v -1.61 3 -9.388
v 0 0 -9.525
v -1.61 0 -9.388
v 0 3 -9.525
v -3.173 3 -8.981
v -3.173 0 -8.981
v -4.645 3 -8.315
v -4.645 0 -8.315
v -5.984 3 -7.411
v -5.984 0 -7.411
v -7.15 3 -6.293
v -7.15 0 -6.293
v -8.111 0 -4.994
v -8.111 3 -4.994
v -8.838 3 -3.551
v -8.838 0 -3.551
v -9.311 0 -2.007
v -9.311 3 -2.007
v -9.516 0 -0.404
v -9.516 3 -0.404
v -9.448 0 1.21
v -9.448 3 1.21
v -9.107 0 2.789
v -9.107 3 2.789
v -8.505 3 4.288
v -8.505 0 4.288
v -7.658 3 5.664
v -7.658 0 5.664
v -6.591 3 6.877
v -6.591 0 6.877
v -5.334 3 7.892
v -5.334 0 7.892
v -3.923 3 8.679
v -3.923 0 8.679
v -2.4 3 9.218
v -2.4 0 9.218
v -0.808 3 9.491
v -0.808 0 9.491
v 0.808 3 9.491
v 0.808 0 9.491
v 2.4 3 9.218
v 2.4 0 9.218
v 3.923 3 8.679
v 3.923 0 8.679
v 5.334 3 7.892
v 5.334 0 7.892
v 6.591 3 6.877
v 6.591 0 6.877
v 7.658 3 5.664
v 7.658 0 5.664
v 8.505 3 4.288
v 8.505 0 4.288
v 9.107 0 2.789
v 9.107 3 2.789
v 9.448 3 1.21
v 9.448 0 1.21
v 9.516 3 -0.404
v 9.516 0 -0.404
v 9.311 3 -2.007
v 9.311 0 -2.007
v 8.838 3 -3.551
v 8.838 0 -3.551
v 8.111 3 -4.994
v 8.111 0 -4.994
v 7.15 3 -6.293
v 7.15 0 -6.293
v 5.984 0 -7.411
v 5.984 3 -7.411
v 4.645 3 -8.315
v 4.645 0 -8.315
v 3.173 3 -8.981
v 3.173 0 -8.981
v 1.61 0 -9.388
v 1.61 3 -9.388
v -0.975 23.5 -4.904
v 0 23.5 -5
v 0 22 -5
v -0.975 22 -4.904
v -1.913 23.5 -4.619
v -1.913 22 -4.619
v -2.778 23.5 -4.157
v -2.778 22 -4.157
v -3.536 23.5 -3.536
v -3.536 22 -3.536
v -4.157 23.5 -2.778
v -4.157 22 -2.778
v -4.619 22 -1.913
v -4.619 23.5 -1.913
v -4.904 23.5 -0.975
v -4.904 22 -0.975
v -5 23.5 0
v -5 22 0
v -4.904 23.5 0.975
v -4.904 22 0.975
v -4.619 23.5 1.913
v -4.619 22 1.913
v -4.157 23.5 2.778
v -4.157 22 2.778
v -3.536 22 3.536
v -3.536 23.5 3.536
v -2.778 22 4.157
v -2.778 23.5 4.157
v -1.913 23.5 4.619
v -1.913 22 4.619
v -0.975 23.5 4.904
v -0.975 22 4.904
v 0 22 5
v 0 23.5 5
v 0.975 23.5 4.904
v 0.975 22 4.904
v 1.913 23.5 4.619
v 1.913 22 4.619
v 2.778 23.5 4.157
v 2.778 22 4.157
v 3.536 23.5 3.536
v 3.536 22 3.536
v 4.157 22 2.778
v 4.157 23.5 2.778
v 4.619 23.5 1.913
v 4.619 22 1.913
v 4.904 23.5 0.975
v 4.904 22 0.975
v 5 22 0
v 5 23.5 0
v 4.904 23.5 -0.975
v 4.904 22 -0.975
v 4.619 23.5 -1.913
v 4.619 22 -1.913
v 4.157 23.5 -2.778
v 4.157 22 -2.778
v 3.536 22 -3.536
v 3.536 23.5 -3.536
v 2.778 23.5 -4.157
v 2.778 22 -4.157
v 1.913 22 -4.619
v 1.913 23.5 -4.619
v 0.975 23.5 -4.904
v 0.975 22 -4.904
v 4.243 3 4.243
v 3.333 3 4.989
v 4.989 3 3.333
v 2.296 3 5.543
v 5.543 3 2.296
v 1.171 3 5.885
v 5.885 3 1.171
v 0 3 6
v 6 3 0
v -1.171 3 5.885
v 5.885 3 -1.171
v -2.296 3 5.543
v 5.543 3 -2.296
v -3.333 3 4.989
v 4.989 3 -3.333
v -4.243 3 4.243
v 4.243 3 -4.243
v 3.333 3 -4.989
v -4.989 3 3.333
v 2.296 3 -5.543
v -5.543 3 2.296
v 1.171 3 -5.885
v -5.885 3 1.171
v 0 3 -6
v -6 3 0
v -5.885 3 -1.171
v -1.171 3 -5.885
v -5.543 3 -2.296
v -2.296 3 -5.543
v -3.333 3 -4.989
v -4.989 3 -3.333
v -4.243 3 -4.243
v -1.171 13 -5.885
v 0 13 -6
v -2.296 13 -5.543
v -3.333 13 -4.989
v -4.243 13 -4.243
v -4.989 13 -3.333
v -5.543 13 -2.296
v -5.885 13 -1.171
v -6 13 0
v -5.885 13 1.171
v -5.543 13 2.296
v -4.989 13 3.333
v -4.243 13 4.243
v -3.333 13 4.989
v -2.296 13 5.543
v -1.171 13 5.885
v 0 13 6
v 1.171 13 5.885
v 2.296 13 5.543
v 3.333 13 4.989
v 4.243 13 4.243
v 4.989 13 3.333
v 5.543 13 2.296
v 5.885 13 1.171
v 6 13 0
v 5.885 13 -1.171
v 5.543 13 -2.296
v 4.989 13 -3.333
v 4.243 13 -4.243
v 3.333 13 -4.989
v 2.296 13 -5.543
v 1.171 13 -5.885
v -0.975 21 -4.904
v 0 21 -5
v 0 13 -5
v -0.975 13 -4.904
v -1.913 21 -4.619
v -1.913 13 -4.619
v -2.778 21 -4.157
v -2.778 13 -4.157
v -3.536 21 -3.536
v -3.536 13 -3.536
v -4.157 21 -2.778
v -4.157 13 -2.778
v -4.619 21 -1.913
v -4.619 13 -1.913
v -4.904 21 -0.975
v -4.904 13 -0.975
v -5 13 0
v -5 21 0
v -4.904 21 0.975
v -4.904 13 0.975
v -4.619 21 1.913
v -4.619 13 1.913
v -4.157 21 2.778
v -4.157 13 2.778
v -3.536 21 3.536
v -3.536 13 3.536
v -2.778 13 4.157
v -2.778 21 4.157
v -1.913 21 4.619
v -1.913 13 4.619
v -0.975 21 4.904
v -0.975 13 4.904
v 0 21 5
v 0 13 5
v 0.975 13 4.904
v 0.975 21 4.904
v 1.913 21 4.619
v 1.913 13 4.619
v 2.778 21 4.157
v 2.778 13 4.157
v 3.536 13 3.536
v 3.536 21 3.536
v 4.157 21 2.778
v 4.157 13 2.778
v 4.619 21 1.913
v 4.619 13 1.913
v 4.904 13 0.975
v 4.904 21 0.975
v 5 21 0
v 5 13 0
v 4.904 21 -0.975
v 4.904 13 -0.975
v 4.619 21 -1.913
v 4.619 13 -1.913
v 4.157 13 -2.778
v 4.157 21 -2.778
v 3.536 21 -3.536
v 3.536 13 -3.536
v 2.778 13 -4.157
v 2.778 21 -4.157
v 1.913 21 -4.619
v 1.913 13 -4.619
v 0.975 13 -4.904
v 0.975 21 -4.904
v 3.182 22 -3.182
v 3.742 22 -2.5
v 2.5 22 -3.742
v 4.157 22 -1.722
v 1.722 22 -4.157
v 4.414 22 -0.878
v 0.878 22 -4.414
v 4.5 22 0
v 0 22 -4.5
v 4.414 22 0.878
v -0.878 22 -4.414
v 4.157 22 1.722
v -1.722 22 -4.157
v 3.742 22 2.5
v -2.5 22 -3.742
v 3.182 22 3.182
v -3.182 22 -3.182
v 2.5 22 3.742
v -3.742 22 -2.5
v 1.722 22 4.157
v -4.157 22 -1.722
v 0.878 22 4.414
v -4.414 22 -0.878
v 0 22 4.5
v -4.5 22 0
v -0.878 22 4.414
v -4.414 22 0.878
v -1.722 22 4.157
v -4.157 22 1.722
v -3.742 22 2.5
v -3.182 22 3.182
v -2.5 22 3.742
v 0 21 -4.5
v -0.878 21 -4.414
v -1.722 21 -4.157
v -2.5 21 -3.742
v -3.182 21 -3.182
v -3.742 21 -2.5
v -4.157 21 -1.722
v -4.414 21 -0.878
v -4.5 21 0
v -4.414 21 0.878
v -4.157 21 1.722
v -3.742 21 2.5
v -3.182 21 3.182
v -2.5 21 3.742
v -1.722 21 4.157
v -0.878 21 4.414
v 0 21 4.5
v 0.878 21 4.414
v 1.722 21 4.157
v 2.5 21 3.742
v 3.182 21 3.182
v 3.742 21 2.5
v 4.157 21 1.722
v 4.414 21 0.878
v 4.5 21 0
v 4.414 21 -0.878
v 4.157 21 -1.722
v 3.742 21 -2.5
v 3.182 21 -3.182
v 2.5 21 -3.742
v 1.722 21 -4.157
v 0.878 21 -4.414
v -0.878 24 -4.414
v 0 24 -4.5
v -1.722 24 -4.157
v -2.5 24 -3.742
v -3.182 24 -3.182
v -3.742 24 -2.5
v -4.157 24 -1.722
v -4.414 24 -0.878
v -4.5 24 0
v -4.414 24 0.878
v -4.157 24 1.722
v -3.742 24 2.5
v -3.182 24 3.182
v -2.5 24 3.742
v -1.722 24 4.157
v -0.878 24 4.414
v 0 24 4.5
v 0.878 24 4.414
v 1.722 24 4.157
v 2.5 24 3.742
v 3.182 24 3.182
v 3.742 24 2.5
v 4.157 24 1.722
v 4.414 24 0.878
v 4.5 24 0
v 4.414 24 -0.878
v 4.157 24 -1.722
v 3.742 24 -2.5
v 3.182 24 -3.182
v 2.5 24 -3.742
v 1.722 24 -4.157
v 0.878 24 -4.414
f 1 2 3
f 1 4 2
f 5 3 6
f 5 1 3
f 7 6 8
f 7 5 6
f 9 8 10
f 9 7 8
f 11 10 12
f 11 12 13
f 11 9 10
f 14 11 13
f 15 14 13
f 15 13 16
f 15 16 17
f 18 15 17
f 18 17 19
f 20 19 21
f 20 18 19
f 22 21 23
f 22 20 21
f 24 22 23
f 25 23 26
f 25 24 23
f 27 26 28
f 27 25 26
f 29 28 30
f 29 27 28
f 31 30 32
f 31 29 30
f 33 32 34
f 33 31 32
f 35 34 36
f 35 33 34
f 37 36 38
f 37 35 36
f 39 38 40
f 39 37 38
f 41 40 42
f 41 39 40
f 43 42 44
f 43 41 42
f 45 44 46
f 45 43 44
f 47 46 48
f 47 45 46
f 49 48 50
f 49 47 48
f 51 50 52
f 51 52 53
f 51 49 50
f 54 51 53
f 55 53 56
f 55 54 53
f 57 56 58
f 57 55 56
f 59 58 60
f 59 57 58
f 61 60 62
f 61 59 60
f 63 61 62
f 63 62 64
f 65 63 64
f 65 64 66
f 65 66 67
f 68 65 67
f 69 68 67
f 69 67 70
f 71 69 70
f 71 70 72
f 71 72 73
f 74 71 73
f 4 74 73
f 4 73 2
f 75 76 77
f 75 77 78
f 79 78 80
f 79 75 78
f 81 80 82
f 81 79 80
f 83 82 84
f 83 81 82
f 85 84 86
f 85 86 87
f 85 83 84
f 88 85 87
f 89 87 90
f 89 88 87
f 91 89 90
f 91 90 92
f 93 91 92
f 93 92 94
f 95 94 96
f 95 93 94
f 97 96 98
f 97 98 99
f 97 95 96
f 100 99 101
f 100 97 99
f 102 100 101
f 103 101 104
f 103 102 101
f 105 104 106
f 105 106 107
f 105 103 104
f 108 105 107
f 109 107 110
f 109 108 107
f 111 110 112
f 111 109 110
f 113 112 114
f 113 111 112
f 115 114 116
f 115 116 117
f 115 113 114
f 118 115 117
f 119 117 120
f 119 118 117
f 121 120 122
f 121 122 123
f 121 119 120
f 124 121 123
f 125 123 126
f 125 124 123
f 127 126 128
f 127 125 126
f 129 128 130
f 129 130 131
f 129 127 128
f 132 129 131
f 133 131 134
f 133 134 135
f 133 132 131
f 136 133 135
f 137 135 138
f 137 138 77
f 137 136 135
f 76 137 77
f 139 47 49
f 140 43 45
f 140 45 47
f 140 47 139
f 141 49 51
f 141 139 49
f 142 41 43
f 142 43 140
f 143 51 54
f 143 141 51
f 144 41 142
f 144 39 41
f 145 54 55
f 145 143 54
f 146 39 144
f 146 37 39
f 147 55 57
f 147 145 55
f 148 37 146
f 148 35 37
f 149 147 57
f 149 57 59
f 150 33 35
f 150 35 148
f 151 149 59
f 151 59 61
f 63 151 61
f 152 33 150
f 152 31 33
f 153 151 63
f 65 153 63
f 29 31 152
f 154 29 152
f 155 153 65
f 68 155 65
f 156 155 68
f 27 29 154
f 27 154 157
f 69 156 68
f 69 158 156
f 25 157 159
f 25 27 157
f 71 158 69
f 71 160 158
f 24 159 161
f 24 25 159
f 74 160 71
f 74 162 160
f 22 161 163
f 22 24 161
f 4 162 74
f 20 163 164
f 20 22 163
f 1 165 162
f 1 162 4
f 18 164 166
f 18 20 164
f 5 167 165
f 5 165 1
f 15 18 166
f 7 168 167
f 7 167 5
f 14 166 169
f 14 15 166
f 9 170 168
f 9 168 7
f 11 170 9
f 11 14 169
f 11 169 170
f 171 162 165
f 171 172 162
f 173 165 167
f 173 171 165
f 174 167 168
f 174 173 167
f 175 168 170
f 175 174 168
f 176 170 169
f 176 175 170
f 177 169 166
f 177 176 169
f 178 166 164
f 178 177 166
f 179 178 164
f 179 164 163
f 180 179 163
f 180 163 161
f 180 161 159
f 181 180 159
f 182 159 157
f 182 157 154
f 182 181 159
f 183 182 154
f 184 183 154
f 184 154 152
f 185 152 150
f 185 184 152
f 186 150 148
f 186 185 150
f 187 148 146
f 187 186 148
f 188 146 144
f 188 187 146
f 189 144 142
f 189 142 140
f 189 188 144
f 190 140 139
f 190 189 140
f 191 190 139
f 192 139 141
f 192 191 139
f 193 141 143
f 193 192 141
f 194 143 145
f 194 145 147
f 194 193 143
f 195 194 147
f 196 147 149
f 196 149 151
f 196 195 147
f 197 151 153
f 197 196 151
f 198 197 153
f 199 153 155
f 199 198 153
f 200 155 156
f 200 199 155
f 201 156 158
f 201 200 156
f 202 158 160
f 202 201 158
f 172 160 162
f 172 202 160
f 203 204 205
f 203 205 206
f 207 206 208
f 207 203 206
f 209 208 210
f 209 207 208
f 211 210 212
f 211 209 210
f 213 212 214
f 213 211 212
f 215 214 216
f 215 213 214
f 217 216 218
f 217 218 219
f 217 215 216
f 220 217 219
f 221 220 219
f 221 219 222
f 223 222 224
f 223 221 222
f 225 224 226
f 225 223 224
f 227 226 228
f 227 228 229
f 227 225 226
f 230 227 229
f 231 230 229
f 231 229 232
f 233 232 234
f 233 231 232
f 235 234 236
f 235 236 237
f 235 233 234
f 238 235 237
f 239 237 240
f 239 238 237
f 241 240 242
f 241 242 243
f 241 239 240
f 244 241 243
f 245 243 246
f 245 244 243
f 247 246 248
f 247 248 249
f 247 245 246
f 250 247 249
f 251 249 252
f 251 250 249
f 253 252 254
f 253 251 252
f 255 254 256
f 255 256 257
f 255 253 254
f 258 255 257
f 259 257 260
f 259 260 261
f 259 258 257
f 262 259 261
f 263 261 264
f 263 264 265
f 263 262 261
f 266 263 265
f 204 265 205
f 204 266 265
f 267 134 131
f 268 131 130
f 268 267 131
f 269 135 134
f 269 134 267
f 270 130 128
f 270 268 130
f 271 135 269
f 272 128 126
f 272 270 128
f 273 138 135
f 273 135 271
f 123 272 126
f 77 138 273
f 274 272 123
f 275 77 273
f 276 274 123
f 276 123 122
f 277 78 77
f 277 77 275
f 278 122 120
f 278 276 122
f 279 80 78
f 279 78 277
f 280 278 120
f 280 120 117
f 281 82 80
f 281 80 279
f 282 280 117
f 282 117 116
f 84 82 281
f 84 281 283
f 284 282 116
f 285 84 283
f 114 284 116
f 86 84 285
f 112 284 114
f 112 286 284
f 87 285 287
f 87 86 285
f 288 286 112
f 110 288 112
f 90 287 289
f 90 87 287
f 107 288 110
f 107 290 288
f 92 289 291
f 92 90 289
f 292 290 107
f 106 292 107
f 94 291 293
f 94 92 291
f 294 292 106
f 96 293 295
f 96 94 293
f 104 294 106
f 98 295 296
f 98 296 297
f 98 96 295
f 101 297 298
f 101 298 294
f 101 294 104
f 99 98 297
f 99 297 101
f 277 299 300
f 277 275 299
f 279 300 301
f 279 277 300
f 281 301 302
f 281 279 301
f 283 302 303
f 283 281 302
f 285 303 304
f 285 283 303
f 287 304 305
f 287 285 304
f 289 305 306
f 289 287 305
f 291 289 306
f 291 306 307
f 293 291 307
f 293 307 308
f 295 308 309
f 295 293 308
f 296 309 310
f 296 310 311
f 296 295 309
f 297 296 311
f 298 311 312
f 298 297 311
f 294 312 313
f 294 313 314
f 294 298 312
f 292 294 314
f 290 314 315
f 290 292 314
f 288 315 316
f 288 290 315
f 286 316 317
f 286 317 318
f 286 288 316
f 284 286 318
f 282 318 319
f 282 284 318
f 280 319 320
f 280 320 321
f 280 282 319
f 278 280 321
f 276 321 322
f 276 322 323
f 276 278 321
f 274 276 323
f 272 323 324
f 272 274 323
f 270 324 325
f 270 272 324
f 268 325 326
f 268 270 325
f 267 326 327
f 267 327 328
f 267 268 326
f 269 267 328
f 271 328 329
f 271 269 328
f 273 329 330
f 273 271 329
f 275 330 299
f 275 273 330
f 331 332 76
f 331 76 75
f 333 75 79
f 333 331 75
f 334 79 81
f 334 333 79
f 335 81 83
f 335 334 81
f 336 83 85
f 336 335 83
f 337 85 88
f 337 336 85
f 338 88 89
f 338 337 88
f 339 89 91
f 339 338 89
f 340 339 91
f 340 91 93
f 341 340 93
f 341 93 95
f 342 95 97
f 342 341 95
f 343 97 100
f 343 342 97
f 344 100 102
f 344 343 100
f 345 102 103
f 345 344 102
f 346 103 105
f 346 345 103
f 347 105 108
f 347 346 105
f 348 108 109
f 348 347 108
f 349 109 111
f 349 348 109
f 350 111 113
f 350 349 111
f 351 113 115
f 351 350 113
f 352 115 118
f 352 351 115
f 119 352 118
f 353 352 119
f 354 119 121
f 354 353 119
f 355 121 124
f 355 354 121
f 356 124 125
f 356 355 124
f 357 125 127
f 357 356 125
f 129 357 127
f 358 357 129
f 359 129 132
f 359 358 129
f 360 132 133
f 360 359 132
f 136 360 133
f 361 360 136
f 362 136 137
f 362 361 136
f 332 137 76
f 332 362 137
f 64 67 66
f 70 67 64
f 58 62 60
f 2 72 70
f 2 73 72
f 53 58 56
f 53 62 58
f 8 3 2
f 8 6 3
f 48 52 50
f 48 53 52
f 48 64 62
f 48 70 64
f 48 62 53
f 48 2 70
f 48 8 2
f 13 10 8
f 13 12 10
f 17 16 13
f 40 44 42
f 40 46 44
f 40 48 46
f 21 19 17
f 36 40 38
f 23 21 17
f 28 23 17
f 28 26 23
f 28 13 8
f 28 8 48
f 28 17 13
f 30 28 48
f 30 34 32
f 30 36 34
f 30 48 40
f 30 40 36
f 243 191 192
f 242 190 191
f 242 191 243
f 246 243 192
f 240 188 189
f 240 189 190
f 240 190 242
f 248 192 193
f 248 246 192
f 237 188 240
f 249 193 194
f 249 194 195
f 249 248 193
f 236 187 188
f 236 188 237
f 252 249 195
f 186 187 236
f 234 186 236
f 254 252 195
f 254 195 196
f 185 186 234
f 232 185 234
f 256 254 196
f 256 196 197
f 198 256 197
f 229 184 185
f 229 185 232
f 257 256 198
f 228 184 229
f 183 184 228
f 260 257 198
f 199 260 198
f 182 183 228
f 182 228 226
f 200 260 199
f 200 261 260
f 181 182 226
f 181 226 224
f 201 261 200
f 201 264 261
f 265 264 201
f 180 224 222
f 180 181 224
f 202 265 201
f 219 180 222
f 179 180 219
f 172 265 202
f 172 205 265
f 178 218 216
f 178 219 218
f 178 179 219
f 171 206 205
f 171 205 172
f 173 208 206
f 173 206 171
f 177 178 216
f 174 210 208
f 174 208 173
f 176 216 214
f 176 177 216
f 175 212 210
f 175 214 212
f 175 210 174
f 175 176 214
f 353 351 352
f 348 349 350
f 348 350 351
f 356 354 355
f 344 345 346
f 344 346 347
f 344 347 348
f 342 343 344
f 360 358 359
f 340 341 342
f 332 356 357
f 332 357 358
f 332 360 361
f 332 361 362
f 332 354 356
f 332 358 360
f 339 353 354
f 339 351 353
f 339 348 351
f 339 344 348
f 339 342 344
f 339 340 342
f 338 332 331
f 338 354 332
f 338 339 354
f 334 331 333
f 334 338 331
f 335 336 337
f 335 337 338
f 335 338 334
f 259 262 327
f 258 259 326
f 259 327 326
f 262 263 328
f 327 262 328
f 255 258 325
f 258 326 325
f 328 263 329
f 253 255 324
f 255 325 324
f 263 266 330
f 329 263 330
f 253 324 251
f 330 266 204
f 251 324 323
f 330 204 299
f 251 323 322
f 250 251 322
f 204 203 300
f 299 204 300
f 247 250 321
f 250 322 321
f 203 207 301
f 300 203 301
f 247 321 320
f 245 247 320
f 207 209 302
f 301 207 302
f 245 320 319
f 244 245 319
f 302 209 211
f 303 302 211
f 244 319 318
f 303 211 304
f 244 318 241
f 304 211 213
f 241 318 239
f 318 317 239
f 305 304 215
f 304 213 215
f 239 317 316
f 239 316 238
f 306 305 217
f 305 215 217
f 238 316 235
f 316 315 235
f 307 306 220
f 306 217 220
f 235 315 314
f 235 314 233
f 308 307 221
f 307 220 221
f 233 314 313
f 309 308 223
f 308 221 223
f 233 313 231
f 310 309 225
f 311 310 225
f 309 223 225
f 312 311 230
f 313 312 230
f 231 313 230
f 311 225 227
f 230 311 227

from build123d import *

# Parameters (mm, degrees)
CROQUIS2_W    = 1
CROQUIS2_H    = 1
CHAFL_N1_SIZE = 0.5


with BuildPart() as part:
    # Croquis1 → Revolución1 (revolve)
    with BuildSketch(Plane.XY, mode=Mode.PRIVATE) as revoluci_n1_sk:
        Polygon((0, 0), (-9.525, 0), (-9.525, 3), (-6, 3), (-6, 13), (-5, 13), (-5, 24), (0, 24), align=None)
    revolve(revoluci_n1_sk.sketch.rotate(Axis((0, 0, 0), (0, 1, 0)), 270), axis=Axis((0, 0, 0), (0, 1, 0)))

    # Croquis2 → Cortar-Revolución1 (revolve, cut)
    with BuildSketch(Plane.XY, mode=Mode.PRIVATE) as cortar_revoluci_n1_sk:
        with Locations((5, 21.5)):
            Rectangle(CROQUIS2_W, CROQUIS2_H)
    revolve(cortar_revoluci_n1_sk.sketch.rotate(Axis((0, 0, 0), (0, 1, 0)), 90), axis=Axis((0, 0, 0), (0, 1, 0)), mode=Mode.SUBTRACT)

    # Chaflán1
    chafl_n1_edges = [part.edges().sort_by_distance(p)[0] for p in [
        (0, 24, 5),
    ]]
    chamfer(chafl_n1_edges, length=CHAFL_N1_SIZE)


solid = part.part
